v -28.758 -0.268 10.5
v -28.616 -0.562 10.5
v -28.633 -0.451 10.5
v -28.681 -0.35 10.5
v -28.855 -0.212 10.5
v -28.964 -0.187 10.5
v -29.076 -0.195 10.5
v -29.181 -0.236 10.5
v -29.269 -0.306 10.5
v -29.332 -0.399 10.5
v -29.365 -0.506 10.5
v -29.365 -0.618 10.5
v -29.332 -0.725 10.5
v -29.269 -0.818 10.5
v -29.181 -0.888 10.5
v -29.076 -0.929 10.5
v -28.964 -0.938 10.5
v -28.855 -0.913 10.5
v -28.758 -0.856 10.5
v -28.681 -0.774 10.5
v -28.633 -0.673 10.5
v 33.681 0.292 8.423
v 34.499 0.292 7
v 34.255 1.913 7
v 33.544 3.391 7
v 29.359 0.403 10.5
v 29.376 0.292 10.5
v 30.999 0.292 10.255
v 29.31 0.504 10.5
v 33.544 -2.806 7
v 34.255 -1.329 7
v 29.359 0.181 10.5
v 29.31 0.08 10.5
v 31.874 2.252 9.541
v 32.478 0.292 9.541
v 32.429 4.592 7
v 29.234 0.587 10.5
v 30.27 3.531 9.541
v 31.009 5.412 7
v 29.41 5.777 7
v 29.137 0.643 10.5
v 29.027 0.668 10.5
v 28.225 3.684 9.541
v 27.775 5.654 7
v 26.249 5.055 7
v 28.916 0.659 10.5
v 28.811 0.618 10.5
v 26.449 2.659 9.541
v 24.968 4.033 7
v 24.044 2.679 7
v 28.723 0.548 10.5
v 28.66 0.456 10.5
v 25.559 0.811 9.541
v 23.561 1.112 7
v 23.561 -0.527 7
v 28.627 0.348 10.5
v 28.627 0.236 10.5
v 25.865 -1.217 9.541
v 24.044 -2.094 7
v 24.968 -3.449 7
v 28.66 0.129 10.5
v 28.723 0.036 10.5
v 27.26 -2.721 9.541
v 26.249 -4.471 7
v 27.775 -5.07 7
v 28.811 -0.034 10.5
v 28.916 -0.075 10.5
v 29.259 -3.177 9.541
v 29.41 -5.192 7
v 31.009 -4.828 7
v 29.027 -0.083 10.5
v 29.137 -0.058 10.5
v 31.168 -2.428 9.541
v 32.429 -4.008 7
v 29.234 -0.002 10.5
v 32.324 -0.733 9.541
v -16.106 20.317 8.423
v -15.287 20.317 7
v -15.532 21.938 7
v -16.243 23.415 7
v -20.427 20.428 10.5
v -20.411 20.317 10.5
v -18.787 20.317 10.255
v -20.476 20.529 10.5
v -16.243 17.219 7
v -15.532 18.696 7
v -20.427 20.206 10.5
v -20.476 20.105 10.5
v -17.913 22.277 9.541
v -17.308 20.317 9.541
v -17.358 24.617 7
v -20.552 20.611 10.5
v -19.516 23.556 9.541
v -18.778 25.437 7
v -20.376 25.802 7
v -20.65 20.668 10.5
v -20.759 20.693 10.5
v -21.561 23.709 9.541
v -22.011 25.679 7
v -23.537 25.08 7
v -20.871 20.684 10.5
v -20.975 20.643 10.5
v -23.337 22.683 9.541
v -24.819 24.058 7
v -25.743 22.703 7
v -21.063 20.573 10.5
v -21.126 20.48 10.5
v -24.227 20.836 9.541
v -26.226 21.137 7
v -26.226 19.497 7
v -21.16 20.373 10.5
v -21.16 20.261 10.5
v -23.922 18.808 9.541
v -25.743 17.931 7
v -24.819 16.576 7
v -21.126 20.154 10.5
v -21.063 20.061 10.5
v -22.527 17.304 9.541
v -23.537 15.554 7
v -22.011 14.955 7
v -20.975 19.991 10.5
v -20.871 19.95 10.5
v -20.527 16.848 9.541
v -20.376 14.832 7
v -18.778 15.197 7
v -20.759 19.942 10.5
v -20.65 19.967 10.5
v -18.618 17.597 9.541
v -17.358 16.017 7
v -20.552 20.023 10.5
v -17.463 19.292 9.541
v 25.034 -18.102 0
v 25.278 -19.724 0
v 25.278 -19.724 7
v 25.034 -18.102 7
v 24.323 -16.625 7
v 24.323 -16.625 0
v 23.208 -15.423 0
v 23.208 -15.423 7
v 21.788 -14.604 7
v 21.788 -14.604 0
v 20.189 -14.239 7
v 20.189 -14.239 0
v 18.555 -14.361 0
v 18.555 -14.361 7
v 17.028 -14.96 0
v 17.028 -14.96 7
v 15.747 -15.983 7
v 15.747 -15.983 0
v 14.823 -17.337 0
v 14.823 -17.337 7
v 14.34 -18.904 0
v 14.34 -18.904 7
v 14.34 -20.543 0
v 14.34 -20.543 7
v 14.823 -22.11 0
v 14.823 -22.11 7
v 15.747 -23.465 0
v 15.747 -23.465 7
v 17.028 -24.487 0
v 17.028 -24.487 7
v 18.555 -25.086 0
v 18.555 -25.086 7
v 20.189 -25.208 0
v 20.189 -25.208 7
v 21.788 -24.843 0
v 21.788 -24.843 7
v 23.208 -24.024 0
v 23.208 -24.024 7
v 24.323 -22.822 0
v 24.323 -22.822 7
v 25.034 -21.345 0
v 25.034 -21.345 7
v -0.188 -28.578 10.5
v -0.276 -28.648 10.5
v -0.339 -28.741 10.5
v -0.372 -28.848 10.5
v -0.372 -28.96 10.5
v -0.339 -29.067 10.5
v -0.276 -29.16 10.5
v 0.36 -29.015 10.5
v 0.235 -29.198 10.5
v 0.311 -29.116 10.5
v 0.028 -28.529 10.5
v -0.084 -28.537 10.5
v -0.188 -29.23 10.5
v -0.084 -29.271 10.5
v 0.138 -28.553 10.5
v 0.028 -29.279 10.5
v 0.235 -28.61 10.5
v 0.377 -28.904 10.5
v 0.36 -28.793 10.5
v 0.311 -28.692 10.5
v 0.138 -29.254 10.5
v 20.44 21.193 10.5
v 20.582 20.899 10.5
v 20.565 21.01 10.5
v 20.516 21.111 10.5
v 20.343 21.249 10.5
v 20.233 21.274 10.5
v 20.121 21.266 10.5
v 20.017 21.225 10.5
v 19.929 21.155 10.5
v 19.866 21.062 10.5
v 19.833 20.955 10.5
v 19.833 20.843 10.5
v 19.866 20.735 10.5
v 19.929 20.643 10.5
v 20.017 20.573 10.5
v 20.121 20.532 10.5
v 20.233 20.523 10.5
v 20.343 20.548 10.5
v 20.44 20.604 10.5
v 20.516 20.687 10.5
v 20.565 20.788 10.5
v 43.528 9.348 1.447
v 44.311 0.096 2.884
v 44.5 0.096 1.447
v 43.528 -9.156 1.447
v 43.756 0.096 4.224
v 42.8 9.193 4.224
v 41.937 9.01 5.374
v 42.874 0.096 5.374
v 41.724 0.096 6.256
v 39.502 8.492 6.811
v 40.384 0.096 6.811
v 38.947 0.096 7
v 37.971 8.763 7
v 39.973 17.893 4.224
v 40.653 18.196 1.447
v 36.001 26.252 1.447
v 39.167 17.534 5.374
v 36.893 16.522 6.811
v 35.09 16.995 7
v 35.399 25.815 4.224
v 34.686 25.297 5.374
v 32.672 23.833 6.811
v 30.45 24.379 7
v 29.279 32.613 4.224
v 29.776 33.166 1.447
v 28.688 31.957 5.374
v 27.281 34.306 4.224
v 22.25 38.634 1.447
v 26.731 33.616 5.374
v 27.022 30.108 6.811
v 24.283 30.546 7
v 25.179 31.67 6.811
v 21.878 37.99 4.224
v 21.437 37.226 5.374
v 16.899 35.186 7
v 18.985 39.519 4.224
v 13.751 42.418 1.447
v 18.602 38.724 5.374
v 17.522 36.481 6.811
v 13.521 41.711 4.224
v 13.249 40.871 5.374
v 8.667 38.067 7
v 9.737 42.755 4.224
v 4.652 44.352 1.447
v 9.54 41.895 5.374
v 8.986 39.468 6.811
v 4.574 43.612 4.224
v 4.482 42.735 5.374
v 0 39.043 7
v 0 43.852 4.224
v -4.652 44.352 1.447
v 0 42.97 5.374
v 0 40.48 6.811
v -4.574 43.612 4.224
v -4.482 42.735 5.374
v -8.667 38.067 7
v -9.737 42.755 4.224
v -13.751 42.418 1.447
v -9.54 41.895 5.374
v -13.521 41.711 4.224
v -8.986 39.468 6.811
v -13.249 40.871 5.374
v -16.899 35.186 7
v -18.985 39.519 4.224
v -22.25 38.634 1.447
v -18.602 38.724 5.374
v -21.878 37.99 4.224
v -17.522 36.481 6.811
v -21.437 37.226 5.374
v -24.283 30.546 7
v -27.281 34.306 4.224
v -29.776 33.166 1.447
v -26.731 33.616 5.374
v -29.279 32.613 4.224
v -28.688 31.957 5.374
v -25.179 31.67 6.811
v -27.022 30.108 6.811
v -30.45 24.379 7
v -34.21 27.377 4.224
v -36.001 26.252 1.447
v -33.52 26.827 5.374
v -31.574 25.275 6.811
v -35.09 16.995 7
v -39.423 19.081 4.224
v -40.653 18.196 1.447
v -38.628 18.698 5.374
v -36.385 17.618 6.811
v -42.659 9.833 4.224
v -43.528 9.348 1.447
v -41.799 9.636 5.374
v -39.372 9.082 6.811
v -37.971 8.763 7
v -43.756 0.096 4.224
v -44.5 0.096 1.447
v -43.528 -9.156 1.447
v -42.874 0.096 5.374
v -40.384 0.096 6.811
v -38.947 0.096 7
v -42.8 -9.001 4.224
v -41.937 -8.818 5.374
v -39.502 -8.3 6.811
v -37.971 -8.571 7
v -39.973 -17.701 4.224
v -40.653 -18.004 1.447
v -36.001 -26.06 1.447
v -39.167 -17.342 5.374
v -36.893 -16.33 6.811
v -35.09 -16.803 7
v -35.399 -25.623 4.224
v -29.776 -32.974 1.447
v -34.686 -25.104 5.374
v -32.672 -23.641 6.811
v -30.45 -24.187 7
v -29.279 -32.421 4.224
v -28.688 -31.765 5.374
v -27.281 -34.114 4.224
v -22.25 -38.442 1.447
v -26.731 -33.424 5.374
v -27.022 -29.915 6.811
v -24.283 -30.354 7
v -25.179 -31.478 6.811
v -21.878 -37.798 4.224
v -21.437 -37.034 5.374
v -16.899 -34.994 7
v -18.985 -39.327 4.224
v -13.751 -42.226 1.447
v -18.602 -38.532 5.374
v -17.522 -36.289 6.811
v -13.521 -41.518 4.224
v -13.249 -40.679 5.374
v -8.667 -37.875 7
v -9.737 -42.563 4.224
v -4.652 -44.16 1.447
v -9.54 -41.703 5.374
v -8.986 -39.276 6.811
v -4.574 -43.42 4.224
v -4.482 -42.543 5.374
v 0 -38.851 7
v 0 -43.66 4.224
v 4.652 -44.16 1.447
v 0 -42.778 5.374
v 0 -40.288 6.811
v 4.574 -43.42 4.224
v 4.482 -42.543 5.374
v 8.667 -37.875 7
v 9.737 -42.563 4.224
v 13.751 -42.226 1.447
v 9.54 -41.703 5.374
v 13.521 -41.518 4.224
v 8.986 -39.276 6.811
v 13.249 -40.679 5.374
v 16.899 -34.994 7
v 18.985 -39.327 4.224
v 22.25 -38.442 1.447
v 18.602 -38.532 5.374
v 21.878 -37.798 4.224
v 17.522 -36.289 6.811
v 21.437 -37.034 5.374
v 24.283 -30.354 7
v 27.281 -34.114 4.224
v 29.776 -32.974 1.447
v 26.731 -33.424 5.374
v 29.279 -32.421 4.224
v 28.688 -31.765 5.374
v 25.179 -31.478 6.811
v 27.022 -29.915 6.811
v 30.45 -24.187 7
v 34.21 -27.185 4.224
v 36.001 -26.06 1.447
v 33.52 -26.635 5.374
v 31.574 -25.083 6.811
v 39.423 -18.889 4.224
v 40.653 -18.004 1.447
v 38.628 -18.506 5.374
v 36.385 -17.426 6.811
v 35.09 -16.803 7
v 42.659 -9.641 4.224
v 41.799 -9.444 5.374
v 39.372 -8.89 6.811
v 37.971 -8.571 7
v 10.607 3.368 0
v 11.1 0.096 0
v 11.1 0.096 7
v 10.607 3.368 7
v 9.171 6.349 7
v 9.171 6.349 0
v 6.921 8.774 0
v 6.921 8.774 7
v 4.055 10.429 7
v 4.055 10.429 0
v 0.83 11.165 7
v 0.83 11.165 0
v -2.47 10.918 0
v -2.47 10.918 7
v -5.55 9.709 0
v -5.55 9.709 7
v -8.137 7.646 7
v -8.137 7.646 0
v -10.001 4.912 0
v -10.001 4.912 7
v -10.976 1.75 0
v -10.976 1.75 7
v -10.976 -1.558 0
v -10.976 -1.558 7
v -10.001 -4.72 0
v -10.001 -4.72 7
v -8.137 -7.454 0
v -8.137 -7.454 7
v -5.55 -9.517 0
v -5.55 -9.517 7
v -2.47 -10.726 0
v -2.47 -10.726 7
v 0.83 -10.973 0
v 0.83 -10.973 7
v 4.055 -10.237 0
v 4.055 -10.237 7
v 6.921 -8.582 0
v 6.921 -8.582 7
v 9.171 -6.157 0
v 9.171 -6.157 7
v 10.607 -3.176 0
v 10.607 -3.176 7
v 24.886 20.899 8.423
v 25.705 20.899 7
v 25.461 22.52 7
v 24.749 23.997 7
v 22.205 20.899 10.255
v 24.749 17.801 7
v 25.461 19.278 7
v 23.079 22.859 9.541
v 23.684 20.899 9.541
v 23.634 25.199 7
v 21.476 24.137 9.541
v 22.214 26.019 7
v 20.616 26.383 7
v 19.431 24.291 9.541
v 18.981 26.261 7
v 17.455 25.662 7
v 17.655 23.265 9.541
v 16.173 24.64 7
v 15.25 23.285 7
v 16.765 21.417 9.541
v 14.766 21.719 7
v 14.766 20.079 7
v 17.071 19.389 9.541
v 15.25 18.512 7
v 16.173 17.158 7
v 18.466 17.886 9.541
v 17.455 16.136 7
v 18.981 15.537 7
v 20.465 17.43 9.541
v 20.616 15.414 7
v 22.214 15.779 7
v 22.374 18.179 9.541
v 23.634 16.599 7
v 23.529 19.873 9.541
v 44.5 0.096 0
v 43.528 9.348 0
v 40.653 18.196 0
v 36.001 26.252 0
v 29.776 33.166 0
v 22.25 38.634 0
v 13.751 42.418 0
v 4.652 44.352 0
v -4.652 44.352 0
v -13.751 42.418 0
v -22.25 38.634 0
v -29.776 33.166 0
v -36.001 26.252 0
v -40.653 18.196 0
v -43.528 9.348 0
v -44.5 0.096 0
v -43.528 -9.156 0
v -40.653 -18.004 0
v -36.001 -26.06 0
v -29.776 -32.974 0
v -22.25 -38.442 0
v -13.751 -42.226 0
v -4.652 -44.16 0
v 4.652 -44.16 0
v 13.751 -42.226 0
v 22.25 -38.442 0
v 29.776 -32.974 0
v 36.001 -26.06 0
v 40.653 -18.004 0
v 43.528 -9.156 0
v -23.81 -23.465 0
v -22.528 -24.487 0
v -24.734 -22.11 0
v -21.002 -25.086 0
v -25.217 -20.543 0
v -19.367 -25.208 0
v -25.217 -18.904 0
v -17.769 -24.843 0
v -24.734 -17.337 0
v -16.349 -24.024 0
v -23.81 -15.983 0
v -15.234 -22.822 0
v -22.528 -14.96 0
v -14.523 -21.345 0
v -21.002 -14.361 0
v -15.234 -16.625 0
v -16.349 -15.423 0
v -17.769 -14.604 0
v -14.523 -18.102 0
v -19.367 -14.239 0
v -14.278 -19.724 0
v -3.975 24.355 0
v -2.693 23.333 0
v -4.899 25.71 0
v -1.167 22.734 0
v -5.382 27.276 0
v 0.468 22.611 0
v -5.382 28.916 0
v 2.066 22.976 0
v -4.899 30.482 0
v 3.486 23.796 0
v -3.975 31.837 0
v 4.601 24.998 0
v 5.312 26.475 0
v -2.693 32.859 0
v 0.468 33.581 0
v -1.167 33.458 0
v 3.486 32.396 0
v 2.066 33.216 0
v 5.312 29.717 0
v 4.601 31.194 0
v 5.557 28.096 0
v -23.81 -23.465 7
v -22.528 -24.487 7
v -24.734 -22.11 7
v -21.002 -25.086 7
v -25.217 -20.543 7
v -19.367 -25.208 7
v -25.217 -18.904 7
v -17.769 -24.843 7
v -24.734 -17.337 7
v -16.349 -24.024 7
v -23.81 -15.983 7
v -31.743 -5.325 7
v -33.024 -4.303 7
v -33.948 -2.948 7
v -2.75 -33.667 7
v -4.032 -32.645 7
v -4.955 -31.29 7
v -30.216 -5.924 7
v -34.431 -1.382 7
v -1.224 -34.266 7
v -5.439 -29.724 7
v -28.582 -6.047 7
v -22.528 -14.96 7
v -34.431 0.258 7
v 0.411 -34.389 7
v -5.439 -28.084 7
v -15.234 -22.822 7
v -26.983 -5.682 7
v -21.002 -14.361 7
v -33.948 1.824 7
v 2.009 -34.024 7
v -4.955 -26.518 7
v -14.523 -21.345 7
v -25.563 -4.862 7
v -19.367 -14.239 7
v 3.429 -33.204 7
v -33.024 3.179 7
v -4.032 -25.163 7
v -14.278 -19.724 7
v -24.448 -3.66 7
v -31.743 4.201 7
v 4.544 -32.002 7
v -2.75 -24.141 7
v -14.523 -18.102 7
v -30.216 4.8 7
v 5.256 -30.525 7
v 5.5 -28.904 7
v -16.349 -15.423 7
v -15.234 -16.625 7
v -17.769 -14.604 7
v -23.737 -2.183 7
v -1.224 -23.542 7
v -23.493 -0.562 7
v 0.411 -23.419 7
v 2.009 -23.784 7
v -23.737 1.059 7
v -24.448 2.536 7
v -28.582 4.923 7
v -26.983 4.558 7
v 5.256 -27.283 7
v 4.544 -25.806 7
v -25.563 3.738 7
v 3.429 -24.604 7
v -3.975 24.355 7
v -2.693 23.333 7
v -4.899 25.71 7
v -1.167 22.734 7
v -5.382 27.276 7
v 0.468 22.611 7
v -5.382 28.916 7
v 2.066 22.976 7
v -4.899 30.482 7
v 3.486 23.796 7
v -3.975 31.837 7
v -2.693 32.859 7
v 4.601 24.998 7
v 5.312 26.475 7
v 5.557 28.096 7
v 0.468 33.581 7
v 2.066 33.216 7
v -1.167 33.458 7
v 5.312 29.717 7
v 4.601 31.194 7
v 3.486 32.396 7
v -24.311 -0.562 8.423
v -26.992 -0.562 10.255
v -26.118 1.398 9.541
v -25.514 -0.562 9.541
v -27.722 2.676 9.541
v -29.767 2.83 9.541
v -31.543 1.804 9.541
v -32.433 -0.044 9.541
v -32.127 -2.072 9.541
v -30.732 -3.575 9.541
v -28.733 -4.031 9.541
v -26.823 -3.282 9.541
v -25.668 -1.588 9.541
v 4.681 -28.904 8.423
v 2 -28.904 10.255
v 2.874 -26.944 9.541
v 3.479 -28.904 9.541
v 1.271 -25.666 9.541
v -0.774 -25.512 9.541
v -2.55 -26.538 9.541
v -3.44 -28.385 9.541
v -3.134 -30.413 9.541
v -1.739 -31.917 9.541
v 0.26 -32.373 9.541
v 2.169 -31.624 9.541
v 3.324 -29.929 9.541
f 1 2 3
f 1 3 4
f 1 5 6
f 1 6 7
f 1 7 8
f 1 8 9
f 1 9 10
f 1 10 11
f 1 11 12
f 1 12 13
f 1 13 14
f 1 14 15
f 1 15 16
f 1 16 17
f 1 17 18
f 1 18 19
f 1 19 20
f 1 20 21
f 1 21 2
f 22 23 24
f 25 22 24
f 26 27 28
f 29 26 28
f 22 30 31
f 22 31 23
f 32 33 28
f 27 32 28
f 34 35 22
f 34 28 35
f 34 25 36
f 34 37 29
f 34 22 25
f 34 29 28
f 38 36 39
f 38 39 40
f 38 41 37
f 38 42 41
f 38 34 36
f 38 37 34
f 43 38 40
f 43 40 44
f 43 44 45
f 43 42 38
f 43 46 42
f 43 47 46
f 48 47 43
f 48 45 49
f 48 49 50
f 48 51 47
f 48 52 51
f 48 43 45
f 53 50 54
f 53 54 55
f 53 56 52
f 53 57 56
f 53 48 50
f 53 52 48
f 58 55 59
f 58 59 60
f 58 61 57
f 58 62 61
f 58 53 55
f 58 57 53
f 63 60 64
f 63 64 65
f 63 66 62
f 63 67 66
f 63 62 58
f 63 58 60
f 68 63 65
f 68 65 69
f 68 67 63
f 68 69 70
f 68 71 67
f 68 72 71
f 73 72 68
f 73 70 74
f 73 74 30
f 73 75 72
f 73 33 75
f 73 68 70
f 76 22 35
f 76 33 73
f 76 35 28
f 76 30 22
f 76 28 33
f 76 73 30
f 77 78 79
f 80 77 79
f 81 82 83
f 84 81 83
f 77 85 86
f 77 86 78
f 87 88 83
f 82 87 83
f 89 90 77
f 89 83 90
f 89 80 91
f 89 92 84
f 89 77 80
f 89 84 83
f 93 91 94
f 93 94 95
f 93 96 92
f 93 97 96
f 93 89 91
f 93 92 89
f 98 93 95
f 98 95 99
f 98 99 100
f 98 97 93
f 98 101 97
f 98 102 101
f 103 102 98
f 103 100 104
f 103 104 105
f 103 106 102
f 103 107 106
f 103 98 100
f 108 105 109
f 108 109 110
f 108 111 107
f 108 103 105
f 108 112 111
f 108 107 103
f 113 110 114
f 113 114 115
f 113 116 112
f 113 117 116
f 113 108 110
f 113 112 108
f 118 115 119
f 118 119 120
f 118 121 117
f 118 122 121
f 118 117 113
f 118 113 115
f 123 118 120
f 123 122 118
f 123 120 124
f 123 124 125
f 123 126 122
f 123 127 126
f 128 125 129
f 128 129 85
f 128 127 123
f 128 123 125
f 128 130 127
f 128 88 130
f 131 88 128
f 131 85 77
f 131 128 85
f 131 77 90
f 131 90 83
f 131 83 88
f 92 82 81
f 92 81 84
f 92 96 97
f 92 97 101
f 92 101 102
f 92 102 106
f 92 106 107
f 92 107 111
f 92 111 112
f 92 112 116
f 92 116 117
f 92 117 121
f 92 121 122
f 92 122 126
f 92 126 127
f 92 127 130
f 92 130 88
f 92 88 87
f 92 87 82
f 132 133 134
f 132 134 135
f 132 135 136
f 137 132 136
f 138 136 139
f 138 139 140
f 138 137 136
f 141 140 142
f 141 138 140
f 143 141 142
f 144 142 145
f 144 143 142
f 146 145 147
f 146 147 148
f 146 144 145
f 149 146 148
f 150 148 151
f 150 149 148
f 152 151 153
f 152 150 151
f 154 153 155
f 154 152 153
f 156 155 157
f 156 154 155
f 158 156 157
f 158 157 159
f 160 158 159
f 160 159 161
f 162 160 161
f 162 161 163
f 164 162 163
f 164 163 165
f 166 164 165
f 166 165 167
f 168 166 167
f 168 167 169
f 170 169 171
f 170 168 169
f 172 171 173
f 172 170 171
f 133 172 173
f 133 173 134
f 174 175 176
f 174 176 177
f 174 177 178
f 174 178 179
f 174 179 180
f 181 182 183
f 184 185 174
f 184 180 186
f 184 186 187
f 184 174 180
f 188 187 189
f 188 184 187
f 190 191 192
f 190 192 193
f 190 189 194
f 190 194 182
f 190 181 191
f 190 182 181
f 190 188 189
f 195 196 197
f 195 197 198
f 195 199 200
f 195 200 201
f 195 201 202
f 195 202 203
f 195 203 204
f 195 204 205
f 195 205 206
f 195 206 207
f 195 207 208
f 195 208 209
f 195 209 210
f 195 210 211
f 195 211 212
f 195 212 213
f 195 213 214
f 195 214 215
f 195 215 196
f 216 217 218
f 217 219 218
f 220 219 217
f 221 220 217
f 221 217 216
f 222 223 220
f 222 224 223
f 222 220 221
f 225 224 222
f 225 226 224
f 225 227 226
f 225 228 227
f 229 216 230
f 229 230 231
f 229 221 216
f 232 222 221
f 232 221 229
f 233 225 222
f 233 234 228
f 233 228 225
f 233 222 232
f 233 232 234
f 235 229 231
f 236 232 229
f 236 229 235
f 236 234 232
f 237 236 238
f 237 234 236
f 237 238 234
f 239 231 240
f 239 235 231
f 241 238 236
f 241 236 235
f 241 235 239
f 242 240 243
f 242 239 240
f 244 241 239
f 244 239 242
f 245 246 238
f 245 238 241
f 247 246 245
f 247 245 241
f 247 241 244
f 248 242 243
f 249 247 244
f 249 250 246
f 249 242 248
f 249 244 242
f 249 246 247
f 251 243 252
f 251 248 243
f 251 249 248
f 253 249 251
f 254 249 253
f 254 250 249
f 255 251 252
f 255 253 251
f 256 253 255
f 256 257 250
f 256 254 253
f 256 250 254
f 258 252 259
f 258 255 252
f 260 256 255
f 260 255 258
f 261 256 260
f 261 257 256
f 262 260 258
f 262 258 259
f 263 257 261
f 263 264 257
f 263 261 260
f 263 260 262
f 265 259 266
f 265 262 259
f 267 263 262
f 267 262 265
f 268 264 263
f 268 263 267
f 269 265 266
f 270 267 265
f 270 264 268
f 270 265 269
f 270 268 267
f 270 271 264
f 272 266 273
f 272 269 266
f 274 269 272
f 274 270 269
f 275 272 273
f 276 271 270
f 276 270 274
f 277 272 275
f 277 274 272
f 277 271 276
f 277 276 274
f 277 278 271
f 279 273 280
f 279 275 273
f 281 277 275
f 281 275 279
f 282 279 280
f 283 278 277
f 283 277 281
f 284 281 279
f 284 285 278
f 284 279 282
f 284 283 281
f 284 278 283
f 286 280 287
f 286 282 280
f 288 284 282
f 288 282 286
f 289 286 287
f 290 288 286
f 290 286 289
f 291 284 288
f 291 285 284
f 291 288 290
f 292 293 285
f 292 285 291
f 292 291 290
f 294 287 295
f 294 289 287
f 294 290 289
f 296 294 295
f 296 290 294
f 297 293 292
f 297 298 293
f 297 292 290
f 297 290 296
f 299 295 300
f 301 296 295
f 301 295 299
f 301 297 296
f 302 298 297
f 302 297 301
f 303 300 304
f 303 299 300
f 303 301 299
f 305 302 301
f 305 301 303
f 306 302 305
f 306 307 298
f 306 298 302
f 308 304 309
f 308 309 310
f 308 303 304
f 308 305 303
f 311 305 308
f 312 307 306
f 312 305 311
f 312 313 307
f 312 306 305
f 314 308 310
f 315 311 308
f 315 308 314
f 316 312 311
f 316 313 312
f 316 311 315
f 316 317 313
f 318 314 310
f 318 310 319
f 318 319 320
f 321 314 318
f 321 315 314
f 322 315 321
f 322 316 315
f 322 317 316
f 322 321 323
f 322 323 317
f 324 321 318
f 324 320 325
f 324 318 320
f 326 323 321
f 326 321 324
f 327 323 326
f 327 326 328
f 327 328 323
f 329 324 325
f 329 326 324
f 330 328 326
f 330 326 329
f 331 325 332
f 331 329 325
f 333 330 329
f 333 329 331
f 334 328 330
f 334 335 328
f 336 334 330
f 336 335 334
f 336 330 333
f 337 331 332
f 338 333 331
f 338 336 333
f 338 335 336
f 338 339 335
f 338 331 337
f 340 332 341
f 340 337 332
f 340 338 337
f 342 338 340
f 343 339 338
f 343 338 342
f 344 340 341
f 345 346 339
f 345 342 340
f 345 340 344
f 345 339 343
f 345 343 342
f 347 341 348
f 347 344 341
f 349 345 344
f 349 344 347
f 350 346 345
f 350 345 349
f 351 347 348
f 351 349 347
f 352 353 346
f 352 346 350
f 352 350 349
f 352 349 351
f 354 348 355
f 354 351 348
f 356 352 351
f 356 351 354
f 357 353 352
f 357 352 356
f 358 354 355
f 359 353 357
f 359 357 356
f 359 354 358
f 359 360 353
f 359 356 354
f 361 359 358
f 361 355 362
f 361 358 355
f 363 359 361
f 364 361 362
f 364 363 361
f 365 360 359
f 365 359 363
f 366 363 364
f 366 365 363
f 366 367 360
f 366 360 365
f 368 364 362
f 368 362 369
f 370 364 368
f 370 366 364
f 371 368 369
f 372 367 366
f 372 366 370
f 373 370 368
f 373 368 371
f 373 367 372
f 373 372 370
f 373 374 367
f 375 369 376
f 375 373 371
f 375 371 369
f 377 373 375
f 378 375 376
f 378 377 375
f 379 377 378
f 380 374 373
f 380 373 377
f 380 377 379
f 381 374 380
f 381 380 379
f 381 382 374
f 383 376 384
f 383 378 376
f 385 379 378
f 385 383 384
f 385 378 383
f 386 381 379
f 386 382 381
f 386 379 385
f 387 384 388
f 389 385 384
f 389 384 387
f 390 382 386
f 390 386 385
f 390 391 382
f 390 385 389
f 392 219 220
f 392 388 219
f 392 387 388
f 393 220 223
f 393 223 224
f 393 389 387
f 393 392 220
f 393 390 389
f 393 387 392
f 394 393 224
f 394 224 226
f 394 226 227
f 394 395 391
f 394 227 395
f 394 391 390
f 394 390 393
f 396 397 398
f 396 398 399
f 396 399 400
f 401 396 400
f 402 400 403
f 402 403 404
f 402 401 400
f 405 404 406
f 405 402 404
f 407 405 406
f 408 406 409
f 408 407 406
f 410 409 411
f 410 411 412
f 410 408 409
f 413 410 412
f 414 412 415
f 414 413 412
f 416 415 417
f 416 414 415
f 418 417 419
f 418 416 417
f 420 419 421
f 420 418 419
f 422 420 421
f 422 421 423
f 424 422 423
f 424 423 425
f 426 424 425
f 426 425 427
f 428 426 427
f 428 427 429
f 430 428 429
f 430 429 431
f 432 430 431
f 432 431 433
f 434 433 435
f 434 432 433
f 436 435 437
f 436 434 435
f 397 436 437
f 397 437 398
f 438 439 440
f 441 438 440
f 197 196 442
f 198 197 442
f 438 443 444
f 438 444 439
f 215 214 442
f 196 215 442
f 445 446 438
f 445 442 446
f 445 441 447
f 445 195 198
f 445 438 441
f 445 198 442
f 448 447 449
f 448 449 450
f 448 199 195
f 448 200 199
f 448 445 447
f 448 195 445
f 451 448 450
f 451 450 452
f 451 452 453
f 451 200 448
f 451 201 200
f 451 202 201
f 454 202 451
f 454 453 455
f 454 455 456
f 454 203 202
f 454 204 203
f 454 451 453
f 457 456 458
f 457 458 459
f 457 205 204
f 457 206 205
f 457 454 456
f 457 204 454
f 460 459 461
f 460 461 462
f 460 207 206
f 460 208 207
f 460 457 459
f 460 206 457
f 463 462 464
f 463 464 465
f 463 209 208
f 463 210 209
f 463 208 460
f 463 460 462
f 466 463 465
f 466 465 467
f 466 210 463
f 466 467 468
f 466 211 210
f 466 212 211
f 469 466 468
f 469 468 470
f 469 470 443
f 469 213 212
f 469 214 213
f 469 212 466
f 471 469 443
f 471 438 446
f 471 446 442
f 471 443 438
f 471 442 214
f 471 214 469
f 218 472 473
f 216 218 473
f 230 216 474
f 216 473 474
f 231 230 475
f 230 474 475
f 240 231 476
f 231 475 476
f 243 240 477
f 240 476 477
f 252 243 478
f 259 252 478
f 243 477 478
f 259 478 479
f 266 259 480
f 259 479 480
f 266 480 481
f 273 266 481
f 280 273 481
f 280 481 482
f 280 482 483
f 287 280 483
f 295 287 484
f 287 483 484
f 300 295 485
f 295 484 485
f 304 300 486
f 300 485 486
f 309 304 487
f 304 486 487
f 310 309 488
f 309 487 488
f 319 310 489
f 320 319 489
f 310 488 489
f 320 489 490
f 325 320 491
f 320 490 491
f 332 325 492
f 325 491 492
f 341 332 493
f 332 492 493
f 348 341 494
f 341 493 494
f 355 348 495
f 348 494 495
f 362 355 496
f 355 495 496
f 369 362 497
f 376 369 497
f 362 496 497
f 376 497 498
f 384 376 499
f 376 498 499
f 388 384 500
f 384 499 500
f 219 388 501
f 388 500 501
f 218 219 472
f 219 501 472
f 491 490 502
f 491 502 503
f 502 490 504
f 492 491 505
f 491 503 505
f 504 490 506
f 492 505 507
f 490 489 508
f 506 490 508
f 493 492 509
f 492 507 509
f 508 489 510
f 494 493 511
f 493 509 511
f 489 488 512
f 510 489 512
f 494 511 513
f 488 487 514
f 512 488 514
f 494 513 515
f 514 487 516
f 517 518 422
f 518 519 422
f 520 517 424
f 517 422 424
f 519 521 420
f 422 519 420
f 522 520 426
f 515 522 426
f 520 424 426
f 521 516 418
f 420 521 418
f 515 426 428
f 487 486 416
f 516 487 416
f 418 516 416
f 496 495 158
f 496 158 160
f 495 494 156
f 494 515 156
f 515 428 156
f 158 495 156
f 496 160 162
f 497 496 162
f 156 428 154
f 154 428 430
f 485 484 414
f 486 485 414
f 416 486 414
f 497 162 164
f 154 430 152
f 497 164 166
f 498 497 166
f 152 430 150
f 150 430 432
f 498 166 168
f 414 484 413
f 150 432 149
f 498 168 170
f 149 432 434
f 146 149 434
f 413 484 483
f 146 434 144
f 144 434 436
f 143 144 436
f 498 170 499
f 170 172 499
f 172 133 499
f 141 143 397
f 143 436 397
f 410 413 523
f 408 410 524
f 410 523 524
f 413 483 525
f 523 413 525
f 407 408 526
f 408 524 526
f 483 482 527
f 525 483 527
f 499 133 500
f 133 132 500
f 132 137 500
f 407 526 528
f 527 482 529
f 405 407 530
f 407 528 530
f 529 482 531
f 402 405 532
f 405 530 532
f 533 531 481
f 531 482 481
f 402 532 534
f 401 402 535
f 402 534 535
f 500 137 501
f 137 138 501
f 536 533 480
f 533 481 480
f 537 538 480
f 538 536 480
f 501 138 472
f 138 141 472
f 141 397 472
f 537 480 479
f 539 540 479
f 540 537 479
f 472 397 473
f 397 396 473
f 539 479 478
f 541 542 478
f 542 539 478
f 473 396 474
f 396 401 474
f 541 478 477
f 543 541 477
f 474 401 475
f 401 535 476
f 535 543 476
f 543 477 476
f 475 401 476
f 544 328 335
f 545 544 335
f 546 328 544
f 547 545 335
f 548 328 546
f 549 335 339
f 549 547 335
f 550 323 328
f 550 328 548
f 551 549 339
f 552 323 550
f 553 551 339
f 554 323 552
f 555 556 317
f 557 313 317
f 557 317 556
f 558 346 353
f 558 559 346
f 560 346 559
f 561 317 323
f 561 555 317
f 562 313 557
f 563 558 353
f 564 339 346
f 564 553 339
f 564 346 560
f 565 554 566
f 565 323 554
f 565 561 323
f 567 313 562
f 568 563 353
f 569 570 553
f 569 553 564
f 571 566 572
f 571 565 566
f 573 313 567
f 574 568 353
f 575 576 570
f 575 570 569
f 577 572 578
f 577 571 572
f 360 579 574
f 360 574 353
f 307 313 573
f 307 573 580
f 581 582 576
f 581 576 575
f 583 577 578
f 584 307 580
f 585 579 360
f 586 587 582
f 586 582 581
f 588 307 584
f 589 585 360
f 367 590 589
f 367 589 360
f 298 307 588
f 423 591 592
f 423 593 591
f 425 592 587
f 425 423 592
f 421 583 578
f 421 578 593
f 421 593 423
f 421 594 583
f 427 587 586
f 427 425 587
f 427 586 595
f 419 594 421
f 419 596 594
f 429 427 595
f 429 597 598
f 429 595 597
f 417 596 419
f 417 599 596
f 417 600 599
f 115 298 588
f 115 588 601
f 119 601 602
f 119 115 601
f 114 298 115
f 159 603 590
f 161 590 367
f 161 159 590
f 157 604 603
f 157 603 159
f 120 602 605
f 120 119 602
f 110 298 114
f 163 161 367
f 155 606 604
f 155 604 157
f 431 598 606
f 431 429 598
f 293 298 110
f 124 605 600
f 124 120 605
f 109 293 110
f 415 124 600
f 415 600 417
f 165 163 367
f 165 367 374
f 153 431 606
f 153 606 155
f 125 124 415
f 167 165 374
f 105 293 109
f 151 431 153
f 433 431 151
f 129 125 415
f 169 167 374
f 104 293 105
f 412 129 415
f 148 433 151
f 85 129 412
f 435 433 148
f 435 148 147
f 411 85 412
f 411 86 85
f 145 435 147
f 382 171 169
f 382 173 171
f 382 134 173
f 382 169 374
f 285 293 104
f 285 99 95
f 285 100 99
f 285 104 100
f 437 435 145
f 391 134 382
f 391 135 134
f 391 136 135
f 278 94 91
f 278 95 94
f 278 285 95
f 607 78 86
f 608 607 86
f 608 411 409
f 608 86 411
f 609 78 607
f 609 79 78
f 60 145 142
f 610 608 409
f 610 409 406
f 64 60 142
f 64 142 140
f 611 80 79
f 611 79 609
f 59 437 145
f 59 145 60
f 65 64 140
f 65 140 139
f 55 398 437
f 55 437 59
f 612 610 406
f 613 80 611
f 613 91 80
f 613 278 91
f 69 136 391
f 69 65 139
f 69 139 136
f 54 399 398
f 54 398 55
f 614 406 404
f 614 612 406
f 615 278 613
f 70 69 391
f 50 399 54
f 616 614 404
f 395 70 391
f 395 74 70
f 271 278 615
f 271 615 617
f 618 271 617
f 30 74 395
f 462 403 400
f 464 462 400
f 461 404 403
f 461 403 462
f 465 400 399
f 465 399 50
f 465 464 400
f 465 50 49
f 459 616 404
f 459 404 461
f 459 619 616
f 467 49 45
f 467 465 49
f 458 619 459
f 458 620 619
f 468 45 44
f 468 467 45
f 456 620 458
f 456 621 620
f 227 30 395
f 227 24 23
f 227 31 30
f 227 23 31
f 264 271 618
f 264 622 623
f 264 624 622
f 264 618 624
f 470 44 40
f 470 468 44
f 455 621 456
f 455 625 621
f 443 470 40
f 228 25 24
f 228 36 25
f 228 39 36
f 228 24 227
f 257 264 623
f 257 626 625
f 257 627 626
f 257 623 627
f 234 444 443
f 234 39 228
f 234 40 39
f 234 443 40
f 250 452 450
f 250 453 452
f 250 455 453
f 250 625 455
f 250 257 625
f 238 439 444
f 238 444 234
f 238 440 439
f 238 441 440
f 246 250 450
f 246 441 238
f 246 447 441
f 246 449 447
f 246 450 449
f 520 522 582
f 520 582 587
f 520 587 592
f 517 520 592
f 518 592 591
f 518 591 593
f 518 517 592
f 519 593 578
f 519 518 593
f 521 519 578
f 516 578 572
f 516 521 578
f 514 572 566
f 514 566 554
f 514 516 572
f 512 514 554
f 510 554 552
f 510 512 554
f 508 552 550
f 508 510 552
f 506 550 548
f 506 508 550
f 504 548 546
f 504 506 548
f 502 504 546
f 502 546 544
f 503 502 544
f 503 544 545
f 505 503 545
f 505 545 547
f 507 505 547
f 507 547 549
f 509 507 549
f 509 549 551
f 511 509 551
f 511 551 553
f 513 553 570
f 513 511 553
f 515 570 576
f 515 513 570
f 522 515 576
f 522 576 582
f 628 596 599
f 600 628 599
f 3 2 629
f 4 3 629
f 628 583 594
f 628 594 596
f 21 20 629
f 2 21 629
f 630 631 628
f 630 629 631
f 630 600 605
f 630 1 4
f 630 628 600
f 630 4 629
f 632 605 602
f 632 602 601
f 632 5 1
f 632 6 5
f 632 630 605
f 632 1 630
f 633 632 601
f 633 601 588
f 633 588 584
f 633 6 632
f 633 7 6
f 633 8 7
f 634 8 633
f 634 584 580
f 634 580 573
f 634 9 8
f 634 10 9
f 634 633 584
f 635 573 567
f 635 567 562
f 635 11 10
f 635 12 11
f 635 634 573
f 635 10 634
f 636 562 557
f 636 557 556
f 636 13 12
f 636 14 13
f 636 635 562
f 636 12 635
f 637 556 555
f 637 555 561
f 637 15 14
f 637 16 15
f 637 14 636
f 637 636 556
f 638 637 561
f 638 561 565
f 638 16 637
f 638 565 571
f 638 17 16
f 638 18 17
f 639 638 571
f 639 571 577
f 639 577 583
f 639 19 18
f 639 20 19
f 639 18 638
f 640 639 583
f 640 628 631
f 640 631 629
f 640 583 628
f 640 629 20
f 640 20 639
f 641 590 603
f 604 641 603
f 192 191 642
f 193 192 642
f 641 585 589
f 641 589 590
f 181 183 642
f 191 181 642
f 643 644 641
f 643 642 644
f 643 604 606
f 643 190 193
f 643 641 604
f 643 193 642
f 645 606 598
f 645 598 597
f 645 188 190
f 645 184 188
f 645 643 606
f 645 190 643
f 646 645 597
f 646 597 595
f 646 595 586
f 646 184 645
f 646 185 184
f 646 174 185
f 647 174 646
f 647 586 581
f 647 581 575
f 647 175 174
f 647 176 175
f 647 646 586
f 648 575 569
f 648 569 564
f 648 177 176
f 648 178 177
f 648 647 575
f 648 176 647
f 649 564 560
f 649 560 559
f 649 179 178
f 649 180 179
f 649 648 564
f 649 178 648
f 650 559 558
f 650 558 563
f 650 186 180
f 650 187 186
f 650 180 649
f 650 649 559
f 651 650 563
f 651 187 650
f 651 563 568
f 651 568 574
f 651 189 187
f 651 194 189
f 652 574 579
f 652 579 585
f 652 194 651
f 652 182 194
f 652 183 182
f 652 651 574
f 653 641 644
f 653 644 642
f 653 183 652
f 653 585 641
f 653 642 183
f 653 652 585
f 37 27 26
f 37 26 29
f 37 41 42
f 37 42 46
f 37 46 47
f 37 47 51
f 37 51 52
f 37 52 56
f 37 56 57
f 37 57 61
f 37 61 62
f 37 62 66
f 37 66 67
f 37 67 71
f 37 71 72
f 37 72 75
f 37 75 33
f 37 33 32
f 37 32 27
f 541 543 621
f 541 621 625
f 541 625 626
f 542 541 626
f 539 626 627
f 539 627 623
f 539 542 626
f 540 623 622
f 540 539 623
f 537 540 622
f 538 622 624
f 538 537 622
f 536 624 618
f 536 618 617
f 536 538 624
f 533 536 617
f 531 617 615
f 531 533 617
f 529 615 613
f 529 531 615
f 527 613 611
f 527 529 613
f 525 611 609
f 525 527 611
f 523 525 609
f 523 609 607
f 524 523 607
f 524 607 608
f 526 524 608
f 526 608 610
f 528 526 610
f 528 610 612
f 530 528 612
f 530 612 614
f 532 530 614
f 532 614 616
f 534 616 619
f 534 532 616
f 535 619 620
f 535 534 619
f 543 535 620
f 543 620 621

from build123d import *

# Parameters (mm, degrees)
F0_R     = 44.5
F0_R_2   = 5.5
F0_R_3   = 11.1
F1_DEPTH = 7
F2_R     = 5.5526911935
F3_R     = 5.5
F4_DEPTH = 3.5


# Not quite as in the source:
# - a fillet or chamfer that OpenCascade refuses, or shapes differently, is made with other operations: its cross-section is extruded or revolved along the edge and cut away or added


with BuildPart() as f1:
    # F0 (on Top) → F1 (new body)
    with BuildSketch(Plane.XY):
        with Locations((1.3388e-06, 0.0960128228)):
            Circle(F0_R)
        with Locations((-19.7783853119, -19.7235588551)):
            Circle(F0_R_2, mode=Mode.SUBTRACT)
        with Locations((19.7783879895, -19.7235588551)):
            Circle(F0_R_2, mode=Mode.SUBTRACT)
        with Locations((1.3388e-06, 0.0960128228)):
            Circle(F0_R_3, mode=Mode.SUBTRACT)
        with Locations((0.0567746402, 28.095976607)):
            Circle(F0_R_2, mode=Mode.SUBTRACT)
    extrude(amount=F1_DEPTH)

    # F2
    f2_edges = [f1.edges().sort_by_distance(p)[0] for p in [
        (-44.499999, 0.096013, 7),
    ]]
    fillet(f2_edges, radius=F2_R)

    # F3 (on face) → F4 (join)
    with BuildSketch(Plane.XY.offset(7)):
        with Locations((20.2050062432, 20.8988438036)):
            Circle(F3_R)
        with Locations((28.9993370366, 0.292301098)):
            Circle(F3_R)
        with Locations((1.3388e-06, -28.9039871772)):
            Circle(F3_R)
        with Locations((-28.9925298787, -0.5621160422)):
            Circle(F3_R)
        with Locations((-20.7871988103, 20.3170985988)):
            Circle(F3_R)
    extrude(amount=F4_DEPTH)

    # F5: fillet of radius 5.5 on 5 edges, made by hand

    # F5_s1 → F5_t2 (revolve, cut)
    with BuildSketch(Plane.XZ.offset(0.5621160422)):
        with BuildLine():
            ThreePointArc((-23.4925298787, 7), (-25.5135868502, 9.5414755311), (-28.6160052617, 10.5))
            Line((-28.6160052617, 10.5), (-23.4925298787, 10.5))
            Line((-23.4925298787, 10.5), (-23.4925298787, 7))
        make_face()
    revolve(axis=Axis((-28.9925298787, -0.5621160422, 10.5), (0, 0, 1)), mode=Mode.SUBTRACT)

    # F5_s3 → F5_t4 (revolve, cut)
    with BuildSketch(Plane.XZ.offset(-20.3170985988)):
        with BuildLine():
            ThreePointArc((-15.2871988103, 7), (-17.3082557818, 9.5414755311), (-20.4106741933, 10.5))
            Line((-20.4106741933, 10.5), (-15.2871988103, 10.5))
            Line((-15.2871988103, 10.5), (-15.2871988103, 7))
        make_face()
    revolve(axis=Axis((-20.7871988103, 20.3170985988, 10.5), (0, 0, 1)), mode=Mode.SUBTRACT)

    # F5_s5 → F5_t6 (revolve, cut)
    with BuildSketch(Plane.XZ.offset(-20.8988438036)):
        with BuildLine():
            ThreePointArc((25.7050062432, 7), (23.6839492717, 9.5414755311), (20.5815308602, 10.5))
            Line((20.5815308602, 10.5), (25.7050062432, 10.5))
            Line((25.7050062432, 10.5), (25.7050062432, 7))
        make_face()
    revolve(axis=Axis((20.2050062432, 20.8988438036, 10.5), (0, 0, 1)), mode=Mode.SUBTRACT)

    # F5_s7 → F5_t8 (revolve, cut)
    with BuildSketch(Plane.XZ.offset(-0.292301098)):
        with BuildLine():
            ThreePointArc((34.4993370366, 7), (32.4782800651, 9.5414755311), (29.3758616536, 10.5))
            Line((29.3758616536, 10.5), (34.4993370366, 10.5))
            Line((34.4993370366, 10.5), (34.4993370366, 7))
        make_face()
    revolve(axis=Axis((28.9993370366, 0.292301098, 10.5), (0, 0, 1)), mode=Mode.SUBTRACT)

    # F5_s9 → F5_t10 (revolve, cut)
    with BuildSketch(Plane.XZ.offset(28.9039871772)):
        with BuildLine():
            ThreePointArc((5.5000013388, 7), (3.4789443673, 9.5414755311), (0.3765259558, 10.5))
            Line((0.3765259558, 10.5), (5.5000013388, 10.5))
            Line((5.5000013388, 10.5), (5.5000013388, 7))
        make_face()
    revolve(axis=Axis((1.3388e-06, -28.9039871772, 10.5), (0, 0, 1)), mode=Mode.SUBTRACT)


solid = f1.part
